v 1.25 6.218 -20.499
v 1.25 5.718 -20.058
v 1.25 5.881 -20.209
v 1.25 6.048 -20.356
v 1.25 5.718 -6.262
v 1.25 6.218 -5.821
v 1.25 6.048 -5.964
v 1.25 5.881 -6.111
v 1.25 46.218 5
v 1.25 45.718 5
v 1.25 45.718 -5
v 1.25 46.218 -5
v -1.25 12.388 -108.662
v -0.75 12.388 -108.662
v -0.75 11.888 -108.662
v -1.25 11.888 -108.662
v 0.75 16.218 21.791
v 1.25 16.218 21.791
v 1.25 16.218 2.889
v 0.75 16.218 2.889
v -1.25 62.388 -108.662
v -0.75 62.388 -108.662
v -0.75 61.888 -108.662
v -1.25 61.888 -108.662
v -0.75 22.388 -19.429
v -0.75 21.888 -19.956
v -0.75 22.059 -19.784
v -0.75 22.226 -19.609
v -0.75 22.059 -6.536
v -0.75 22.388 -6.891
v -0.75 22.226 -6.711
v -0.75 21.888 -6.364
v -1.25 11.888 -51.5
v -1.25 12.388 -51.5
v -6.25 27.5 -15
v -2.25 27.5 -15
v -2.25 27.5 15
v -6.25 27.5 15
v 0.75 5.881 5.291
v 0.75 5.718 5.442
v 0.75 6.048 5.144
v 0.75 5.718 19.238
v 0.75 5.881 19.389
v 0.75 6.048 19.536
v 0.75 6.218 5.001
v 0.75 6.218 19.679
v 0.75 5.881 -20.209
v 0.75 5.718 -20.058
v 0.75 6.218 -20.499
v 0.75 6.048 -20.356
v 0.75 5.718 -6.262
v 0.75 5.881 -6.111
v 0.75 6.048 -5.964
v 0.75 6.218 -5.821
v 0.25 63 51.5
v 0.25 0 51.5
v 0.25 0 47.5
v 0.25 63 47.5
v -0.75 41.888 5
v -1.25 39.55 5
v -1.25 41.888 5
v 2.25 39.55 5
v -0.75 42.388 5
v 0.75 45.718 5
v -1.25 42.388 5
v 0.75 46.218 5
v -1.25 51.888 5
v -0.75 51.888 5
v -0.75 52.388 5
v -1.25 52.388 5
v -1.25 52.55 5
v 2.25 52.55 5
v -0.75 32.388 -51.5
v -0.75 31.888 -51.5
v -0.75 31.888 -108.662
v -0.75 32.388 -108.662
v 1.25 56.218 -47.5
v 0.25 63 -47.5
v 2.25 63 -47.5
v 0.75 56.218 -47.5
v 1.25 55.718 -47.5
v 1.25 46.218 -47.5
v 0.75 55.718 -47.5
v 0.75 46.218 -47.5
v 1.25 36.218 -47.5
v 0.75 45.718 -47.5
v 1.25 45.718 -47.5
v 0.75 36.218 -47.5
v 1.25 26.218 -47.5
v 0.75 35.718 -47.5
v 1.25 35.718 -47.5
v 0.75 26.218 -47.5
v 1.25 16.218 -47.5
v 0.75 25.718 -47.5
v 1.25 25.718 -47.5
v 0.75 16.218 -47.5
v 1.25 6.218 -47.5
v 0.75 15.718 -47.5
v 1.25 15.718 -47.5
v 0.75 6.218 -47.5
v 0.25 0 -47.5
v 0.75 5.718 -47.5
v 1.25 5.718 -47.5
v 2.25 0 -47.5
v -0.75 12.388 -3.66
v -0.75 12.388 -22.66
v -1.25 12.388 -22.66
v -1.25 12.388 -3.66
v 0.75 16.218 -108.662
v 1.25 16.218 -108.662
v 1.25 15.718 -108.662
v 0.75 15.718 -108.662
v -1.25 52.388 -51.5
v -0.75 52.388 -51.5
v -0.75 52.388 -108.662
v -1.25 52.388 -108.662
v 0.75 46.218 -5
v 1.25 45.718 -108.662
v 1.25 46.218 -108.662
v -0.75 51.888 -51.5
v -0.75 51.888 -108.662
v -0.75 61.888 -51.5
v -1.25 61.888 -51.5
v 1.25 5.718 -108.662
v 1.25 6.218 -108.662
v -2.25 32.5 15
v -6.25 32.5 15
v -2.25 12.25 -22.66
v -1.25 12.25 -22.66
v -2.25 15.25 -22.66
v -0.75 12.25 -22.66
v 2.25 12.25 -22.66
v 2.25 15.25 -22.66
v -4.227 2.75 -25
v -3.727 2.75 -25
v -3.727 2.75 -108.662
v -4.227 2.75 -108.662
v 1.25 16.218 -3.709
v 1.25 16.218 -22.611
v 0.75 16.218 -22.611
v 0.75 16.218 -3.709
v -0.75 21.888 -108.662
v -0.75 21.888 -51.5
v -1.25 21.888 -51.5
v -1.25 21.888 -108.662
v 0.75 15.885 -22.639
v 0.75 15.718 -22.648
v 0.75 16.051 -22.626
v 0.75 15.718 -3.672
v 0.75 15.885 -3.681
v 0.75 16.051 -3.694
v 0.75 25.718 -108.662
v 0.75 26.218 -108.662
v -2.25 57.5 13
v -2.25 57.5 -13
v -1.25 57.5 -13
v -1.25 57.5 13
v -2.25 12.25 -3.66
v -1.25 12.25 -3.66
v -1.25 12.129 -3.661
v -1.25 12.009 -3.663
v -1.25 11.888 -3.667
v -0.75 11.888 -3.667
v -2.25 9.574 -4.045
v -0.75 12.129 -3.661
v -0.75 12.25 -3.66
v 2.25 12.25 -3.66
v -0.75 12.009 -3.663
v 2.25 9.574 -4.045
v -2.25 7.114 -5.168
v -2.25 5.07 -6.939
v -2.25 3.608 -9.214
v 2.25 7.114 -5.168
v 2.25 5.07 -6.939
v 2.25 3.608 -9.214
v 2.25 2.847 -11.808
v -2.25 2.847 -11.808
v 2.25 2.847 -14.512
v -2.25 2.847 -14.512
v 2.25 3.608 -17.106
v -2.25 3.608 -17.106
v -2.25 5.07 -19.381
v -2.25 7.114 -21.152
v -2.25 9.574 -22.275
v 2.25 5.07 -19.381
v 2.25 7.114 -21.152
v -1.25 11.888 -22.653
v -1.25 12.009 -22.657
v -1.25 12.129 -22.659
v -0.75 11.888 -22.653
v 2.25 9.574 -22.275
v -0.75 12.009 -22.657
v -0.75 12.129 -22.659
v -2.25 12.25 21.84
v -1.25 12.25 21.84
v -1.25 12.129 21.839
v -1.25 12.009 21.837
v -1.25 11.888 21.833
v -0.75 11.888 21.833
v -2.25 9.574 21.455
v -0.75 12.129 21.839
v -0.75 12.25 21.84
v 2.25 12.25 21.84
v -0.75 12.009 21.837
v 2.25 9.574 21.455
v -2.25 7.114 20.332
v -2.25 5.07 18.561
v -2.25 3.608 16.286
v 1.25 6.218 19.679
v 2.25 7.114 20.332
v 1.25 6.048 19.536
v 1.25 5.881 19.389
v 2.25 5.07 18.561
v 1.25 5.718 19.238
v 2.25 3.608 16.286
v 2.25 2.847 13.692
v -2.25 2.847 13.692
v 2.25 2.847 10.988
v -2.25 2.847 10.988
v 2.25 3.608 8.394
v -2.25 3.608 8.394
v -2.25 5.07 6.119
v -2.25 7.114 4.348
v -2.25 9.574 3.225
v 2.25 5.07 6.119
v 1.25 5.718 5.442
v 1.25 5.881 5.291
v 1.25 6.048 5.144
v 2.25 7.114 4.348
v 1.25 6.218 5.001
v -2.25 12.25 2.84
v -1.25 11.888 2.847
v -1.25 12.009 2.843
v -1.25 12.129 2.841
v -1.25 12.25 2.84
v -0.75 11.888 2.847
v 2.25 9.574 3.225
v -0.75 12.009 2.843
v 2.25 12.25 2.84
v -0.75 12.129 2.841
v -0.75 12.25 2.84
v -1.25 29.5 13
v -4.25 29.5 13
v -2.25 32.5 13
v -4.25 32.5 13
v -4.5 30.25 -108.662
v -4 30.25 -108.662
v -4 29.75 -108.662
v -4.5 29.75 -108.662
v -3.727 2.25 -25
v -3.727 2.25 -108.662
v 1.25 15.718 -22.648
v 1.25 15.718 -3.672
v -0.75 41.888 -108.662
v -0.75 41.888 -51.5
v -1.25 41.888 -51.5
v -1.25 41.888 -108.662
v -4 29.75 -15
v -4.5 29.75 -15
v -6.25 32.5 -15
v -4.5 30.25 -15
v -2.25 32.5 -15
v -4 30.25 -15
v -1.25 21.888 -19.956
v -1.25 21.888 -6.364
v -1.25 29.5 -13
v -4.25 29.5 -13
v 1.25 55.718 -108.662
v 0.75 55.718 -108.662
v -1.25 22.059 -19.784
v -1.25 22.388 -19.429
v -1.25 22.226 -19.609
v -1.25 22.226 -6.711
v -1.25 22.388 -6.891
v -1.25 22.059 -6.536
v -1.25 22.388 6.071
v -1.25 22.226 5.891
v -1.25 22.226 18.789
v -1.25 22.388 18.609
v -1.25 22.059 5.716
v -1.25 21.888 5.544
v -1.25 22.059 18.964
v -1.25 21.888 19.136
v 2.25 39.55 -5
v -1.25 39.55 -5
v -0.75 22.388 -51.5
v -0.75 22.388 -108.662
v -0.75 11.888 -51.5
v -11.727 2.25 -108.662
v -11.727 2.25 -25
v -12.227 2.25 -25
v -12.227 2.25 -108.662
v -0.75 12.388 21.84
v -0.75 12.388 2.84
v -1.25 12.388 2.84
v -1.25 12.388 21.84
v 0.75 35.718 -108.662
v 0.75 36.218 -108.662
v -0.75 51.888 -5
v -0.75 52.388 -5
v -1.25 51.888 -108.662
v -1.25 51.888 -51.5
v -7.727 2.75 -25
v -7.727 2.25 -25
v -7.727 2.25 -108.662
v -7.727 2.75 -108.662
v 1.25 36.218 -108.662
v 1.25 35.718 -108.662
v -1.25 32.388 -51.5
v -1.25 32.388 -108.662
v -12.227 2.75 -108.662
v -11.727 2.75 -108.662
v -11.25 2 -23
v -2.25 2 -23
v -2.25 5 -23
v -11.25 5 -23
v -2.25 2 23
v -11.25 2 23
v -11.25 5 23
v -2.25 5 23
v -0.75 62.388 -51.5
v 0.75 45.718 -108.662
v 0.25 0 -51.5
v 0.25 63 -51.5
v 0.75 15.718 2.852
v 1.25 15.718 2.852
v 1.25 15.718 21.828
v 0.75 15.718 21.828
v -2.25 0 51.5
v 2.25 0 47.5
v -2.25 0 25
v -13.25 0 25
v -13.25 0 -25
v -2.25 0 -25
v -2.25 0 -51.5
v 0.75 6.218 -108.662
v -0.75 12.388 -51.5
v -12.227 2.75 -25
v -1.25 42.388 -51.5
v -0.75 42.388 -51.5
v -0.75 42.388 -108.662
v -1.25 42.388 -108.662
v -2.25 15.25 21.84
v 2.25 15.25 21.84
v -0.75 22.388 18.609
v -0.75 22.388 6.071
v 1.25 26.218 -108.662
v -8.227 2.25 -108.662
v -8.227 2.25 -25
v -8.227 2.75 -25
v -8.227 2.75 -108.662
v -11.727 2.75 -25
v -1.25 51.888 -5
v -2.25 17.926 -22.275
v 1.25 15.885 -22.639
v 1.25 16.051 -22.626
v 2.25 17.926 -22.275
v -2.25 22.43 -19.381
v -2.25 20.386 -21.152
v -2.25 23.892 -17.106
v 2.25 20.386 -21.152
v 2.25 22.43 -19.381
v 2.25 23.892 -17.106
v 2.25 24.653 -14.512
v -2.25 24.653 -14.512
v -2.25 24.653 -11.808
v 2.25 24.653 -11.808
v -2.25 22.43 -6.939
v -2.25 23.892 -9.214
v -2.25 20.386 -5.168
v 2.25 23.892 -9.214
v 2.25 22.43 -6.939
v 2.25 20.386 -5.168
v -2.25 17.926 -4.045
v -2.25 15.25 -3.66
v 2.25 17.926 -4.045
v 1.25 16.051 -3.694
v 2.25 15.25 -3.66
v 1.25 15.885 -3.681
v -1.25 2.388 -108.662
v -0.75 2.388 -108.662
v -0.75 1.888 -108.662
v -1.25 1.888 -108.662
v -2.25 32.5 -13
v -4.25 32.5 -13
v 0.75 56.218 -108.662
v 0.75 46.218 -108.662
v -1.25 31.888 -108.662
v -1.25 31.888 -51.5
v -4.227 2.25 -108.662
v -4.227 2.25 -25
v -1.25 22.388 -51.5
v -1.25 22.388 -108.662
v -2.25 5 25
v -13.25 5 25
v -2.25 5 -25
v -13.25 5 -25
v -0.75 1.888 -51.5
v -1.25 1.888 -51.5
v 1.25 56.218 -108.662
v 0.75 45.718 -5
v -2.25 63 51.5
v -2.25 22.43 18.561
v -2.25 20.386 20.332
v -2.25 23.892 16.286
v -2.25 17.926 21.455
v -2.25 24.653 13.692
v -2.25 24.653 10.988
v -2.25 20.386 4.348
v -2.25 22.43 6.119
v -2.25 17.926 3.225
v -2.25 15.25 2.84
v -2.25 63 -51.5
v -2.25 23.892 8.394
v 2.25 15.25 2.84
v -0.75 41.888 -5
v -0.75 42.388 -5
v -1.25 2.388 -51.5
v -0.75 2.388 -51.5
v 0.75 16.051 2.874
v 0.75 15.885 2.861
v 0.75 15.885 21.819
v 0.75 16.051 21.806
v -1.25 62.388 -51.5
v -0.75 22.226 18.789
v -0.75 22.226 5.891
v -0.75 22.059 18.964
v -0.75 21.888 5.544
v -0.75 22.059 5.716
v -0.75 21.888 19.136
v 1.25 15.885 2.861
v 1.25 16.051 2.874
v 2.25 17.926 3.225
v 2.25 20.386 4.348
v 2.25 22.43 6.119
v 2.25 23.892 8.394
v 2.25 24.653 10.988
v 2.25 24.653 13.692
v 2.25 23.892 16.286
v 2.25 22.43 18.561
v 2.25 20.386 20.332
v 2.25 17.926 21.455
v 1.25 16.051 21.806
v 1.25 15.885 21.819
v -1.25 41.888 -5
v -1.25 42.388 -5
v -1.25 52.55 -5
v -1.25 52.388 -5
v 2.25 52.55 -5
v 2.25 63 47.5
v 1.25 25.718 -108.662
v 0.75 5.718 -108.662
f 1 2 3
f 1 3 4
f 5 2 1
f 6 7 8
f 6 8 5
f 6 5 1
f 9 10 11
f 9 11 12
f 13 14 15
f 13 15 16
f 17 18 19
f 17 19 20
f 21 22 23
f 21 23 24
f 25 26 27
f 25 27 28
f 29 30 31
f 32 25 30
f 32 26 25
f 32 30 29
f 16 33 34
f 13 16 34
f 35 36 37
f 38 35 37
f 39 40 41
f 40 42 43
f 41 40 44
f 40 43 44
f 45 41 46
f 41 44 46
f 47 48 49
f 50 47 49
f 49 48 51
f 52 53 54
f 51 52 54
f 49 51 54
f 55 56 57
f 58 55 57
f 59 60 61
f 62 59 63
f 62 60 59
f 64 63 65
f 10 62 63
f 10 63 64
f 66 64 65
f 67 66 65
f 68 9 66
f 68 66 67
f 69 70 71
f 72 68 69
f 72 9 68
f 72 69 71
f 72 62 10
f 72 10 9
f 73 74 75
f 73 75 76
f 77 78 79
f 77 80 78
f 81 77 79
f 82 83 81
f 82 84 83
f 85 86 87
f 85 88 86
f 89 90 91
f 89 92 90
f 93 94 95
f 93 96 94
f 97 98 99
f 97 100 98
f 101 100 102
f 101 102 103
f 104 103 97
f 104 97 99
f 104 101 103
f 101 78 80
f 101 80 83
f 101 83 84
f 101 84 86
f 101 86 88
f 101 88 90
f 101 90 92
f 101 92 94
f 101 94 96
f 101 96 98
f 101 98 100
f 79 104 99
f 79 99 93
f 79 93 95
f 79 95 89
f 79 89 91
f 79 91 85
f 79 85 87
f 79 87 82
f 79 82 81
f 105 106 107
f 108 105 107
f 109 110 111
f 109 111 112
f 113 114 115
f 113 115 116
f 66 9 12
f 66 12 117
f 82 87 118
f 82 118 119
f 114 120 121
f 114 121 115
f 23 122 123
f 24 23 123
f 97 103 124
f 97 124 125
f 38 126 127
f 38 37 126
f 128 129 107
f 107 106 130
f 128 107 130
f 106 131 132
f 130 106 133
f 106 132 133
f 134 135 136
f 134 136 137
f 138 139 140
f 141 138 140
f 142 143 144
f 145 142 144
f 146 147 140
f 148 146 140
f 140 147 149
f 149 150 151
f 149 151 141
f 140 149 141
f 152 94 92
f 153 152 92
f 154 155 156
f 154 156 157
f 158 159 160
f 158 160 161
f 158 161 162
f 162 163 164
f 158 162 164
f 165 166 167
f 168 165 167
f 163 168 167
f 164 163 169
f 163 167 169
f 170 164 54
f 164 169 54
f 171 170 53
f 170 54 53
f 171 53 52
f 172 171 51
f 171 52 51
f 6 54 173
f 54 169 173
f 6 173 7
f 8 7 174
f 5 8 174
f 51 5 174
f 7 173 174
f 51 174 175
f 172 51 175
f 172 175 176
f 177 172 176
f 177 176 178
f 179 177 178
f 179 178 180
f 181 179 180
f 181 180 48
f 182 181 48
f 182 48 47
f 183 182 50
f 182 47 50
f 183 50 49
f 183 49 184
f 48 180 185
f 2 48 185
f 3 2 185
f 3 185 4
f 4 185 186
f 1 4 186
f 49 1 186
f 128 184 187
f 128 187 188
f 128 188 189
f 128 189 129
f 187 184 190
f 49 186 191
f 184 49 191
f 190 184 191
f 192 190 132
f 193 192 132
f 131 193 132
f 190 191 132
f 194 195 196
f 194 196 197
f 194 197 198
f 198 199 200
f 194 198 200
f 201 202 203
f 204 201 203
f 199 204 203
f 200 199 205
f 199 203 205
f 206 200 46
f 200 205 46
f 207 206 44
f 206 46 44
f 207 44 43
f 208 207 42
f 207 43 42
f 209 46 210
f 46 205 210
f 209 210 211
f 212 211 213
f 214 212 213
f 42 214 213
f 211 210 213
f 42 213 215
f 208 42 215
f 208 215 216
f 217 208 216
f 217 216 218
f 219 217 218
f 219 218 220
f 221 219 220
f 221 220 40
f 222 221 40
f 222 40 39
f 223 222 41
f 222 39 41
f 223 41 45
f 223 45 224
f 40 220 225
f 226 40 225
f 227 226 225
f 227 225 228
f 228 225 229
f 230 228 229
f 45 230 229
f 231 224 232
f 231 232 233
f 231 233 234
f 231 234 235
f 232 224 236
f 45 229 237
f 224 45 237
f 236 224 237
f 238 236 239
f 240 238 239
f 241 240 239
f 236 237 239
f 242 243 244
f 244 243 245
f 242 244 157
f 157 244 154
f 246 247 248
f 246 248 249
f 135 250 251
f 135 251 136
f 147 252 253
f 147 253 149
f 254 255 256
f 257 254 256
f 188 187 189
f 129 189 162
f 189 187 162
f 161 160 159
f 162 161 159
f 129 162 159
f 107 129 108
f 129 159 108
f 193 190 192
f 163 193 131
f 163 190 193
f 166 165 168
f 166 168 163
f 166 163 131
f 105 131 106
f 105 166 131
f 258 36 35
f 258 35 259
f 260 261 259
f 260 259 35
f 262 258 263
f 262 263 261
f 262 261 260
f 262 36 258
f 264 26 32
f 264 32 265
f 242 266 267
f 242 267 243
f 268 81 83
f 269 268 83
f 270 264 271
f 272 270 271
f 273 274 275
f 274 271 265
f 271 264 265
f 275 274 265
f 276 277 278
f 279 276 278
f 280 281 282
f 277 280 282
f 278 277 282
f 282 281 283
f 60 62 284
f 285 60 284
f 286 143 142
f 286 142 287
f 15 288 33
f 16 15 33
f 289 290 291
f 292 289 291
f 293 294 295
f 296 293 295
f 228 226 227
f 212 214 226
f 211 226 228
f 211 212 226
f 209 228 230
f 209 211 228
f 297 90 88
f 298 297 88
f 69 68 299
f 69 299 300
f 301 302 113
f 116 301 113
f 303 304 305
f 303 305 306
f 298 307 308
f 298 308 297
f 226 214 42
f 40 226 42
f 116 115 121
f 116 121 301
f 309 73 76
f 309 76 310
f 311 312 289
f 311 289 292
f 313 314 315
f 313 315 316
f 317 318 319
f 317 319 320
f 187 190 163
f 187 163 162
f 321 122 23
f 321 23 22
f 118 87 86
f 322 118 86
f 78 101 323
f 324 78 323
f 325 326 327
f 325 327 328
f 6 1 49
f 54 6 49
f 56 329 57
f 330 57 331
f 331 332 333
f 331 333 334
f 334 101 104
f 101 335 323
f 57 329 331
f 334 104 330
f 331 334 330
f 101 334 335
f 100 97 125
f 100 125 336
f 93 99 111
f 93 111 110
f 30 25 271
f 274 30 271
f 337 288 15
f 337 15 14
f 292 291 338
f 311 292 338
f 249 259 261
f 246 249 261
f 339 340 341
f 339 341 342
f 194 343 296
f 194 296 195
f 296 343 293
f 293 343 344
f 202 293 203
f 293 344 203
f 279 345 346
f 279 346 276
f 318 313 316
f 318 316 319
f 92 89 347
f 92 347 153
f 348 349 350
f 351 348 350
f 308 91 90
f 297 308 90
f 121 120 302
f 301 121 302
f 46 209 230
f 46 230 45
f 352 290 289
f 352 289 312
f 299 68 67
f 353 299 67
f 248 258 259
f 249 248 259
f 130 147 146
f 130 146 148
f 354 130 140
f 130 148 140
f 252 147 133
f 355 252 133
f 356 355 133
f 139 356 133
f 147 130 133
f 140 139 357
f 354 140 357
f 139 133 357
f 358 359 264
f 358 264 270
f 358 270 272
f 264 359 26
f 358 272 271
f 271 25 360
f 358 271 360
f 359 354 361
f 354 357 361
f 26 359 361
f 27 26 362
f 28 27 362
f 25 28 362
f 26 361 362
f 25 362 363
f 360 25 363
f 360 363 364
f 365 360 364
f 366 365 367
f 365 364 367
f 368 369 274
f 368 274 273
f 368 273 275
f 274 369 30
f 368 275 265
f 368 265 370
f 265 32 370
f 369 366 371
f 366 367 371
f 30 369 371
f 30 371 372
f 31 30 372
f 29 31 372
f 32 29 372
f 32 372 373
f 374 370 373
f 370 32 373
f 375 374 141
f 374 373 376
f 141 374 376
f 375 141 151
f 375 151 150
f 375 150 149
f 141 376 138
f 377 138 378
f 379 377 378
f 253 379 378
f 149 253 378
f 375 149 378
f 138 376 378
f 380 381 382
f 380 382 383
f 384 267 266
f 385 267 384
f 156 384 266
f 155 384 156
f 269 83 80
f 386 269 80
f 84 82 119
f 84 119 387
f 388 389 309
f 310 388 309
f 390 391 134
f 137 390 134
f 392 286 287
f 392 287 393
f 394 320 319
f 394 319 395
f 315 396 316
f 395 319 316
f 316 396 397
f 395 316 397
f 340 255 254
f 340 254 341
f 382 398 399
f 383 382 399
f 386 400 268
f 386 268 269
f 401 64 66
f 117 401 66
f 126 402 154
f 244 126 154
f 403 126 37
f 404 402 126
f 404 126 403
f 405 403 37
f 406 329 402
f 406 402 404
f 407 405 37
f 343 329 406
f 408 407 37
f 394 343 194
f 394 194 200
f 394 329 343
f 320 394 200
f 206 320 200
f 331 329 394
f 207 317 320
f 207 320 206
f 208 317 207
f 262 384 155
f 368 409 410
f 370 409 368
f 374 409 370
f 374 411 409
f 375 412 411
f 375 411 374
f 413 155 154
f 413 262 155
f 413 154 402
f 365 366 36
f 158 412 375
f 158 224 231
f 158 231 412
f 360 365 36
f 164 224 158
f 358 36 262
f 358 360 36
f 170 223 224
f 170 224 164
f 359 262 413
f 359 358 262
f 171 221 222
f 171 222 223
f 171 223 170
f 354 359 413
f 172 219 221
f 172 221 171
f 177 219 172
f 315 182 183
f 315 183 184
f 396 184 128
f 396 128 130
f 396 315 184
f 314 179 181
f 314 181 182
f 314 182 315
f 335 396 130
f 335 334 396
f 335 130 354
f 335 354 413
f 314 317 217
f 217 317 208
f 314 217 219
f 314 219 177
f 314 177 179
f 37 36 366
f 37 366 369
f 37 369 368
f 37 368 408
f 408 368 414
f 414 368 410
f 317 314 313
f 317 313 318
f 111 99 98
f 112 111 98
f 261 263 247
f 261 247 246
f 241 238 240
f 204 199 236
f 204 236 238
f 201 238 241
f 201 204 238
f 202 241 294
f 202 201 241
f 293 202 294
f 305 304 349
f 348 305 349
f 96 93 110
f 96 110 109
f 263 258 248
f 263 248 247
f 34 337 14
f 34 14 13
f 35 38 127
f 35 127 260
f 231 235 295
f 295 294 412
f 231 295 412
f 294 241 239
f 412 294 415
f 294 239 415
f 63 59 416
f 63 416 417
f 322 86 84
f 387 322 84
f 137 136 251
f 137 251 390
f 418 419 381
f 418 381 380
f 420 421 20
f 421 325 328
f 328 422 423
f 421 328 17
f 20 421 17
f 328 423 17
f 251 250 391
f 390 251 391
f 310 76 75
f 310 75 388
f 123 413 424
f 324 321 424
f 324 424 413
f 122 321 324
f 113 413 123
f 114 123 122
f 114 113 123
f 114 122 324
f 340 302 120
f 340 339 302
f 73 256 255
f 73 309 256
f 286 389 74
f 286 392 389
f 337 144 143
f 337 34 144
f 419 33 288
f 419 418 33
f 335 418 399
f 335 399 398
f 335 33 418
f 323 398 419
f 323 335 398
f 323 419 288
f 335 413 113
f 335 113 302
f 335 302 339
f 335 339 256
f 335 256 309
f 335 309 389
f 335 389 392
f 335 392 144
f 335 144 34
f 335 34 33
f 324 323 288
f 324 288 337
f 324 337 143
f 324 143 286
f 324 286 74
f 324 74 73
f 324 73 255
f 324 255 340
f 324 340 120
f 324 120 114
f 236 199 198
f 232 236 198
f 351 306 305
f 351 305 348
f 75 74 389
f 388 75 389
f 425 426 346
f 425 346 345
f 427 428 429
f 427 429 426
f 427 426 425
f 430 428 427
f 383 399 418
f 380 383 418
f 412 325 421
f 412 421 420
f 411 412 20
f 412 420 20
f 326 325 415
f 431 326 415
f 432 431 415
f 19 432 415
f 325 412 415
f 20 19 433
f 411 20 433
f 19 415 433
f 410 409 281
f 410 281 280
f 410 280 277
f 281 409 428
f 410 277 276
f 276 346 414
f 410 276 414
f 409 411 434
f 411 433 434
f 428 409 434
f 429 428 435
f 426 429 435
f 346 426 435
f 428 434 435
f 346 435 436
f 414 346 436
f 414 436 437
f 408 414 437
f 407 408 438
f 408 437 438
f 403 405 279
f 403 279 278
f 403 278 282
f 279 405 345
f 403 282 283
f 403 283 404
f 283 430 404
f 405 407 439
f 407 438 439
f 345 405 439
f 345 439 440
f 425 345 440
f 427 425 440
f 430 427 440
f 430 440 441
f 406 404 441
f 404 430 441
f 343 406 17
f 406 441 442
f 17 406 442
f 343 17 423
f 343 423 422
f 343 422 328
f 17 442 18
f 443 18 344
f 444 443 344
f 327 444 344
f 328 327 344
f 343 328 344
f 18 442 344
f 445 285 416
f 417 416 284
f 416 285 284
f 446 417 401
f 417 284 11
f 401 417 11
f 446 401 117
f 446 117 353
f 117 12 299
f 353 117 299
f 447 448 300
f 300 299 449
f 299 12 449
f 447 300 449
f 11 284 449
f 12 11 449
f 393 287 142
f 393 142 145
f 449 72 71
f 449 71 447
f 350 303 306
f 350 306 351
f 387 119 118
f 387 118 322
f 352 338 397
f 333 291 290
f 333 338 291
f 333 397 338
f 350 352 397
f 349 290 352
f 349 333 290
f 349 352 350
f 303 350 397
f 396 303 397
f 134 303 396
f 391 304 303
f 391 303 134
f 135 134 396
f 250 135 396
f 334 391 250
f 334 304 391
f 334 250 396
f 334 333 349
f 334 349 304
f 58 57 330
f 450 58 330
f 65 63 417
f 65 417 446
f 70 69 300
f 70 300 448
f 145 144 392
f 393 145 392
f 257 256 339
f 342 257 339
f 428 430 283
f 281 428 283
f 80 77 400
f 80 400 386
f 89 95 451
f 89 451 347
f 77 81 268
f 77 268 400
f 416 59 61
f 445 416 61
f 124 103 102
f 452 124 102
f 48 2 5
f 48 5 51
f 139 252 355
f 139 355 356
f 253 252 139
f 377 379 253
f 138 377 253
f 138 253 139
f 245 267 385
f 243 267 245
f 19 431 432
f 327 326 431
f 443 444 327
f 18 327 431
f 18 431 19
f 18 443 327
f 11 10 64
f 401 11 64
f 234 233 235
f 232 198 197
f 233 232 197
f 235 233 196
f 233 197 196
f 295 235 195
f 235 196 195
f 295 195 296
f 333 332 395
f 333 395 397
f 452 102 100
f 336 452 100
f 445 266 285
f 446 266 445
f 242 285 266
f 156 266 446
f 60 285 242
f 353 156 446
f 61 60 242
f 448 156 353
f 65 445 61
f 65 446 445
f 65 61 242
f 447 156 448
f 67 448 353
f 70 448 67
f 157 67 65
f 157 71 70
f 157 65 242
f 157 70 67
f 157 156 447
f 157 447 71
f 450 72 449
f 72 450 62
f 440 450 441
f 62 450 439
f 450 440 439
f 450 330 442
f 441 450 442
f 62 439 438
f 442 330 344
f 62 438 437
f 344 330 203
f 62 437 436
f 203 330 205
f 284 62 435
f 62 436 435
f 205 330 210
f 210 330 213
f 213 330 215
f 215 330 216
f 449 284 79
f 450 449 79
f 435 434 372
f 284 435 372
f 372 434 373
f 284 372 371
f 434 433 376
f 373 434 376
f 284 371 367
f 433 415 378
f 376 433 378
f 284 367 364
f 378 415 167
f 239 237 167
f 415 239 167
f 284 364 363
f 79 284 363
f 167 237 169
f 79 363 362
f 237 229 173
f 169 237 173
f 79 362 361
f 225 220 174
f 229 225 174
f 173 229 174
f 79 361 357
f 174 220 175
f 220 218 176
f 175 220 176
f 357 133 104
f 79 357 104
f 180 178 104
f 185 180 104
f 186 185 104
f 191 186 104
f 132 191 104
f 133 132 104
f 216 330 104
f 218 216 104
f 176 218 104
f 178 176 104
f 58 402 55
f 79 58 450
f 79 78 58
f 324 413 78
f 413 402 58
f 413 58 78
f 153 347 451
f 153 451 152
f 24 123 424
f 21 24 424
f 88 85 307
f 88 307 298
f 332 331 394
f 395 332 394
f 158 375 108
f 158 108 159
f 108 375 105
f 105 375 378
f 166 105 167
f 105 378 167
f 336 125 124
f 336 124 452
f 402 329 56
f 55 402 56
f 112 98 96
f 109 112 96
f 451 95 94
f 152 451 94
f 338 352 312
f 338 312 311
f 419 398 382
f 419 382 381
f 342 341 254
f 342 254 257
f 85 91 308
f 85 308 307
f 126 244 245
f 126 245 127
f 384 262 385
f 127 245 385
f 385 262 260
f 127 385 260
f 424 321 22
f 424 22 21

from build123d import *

# Parameters (mm, degrees)
SKETCH_1_W          = 2.5
SKETCH_1_H          = 103
SKETCH_1_W_2        = 2
SKETCH_1_H_2        = 95
EXTRUDE_1_DEPTH     = 63
SKETCH_5_W          = 50
SKETCH_5_H          = 2
EXTRUDE_2_DEPTH     = 11
EXTRUDE_3_DEPTH     = 3
CUT_EXTRUDE_1_DEPTH = 4.5
SKETCH_11_W         = 8.5
SKETCH_11_H         = 11.5
CUT_EXTRUDE_2_DEPTH = 4.5
SKETCH_12_W         = 26
SKETCH_12_H         = 28
SKETCH_12_W_2       = 25
SKETCH_12_H_2       = 27
SKETCH_12_W_3       = 8.5
SKETCH_12_H_3       = 11.5
CUT_EXTRUDE_3_DEPTH = 1
SKETCH_13_W         = 30
SKETCH_13_H         = 2
EXTRUDE_4_DEPTH     = 4
EXTRUDE_5_DEPTH     = 3
SKETCH_15_W         = 10
SKETCH_15_H         = 13
CUT_EXTRUDE_5_DEPTH = 10
EXTRUDE_START       = -73.34
SKETCH_16_W         = 0.5
SKETCH_16_H         = 0.5
EXTRUDE_6_DEPTH     = 130.501615
EXTRUDE_START_2     = -69.328472
SKETCH_17_W         = 0.5
SKETCH_17_H         = 0.5
EXTRUDE_7_DEPTH     = 130.490087
SKETCH_18_W         = 0.5
SKETCH_18_H         = 0.5
EXTRUDE_8_DEPTH     = 83.66161453
SKETCH_19_W         = 0.5
SKETCH_19_H         = 0.5
EXTRUDE_9_DEPTH     = 93.66161453


with BuildPart() as part:
    # 스케치1 → 보스-돌출1 (new body)
    with BuildSketch(Plane(origin=(0, 0, 0), x_dir=(1, 0, 0), z_dir=(0, 1, 0))):
        with Locations((-1, 0)):
            Rectangle(SKETCH_1_W, SKETCH_1_H)
        with Locations((1.25, 0)):
            Rectangle(SKETCH_1_W_2, SKETCH_1_H_2)
    extrude(amount=EXTRUDE_1_DEPTH)

    # 스케치5 → 보스-돌출2 (add)
    with BuildSketch(Plane.ZY.offset(2.25)):
        with Locations((0, 1)):
            Rectangle(SKETCH_5_W, SKETCH_5_H)
    extrude(amount=EXTRUDE_2_DEPTH)

    # 스케치7 → 보스-돌출3 (add)
    with BuildSketch(Plane(origin=(0, 2, 0), x_dir=(1, 0, 0), z_dir=(0, 1, 0))):
        Polygon((-2.25, 23), (-11.25, 23), (-11.25, -23), (-2.25, -23), (-2.25, -25), (-13.25, -25), (-13.25, 25), (-2.25, 25), align=None)
    extrude(amount=EXTRUDE_3_DEPTH)

    # 스케치10 → 컷-돌출1 (cut)
    with BuildSketch(Plane(origin=(2.25, 0, 0), x_dir=(0, 0, -1), z_dir=(1, 0, 0))):
        with BuildLine():
            Line((-21.84, 15.25), (-21.84, 12.25))
            ThreePointArc((-21.84, 12.25), (-12.34, 2.75), (-2.84, 12.25))
            Line((-2.84, 12.25), (-2.84, 15.25))
            ThreePointArc((-2.84, 15.25), (-12.34, 24.75), (-21.84, 15.25))
        make_face()
        with BuildLine():
            Line((3.66, 15.25), (3.66, 12.25))
            ThreePointArc((3.66, 12.25), (13.16, 2.75), (22.66, 12.25))
            Line((22.66, 12.25), (22.66, 15.25))
            ThreePointArc((22.66, 15.25), (13.16, 24.75), (3.66, 15.25))
        make_face()
    extrude(amount=-CUT_EXTRUDE_1_DEPTH, mode=Mode.SUBTRACT)

    # 스케치11 → 컷-돌출2 (cut)
    with BuildSketch(Plane.ZY.offset(2.25)):
        with Locations((0, 46.05)):
            Rectangle(SKETCH_11_W, SKETCH_11_H)
    extrude(amount=-CUT_EXTRUDE_2_DEPTH, mode=Mode.SUBTRACT)

    # 스케치12 → 컷-돌출3 (cut)
    # profile 1 of 2: a face of its own
    with BuildSketch(Plane.ZY.offset(2.25)):
        with Locations((0, 43.5)):
            Rectangle(SKETCH_12_W, SKETCH_12_H)
        with Locations((0, 43.5)):
            Rectangle(SKETCH_12_W_2, SKETCH_12_H_2, mode=Mode.SUBTRACT)
    # profile 2 of 2: a face of its own
    with BuildSketch(Plane.ZY.offset(2.25)):
        with Locations((0, 43.5)):
            Rectangle(SKETCH_12_W_2, SKETCH_12_H_2)
        with Locations((0, 46.05)):
            Rectangle(SKETCH_12_W_3, SKETCH_12_H_3, mode=Mode.SUBTRACT)
    extrude(amount=-CUT_EXTRUDE_3_DEPTH, mode=Mode.SUBTRACT)

    # 스케치13 → 보스-돌출4 (add)
    with BuildSketch(Plane.ZY.offset(2.25)):
        with Locations((0, 28.5)):
            Rectangle(SKETCH_13_W, SKETCH_13_H)
    extrude(amount=EXTRUDE_4_DEPTH)

    # 스케치14 → 보스-돌출5 (add)
    with BuildSketch(Plane(origin=(0, 29.5, 0), x_dir=(1, 0, 0), z_dir=(0, 1, 0))):
        Polygon((-2.25, -13), (-2.25, -15), (-6.25, -15), (-6.25, 15), (-2.25, 15), (-2.25, 13), (-4.25, 13), (-4.25, -13), align=None)
    extrude(amount=EXTRUDE_5_DEPTH)

    # 스케치15 → 컷-돌출5 (cut)
    with BuildSketch(Plane(origin=(2.25, 0, 0), x_dir=(0, 0, -1), z_dir=(1, 0, 0))):
        with Locations((0, 46.05)):
            Rectangle(SKETCH_15_W, SKETCH_15_H)
    extrude(amount=-CUT_EXTRUDE_5_DEPTH, mode=Mode.SUBTRACT)

    # 스케치16 → 보스-돌출6 (add)
    with BuildSketch(Plane(origin=(0, 0, -51.5), x_dir=(-1, 0, 0), z_dir=(0, 0, -1)).offset(EXTRUDE_START)):
        with Locations((1, 2.138286898)):
            Rectangle(SKETCH_16_W, SKETCH_16_H)
        with Locations((1, 12.138286898)):
            Rectangle(SKETCH_16_W, SKETCH_16_H)
        with Locations((1, 22.138286898)):
            Rectangle(SKETCH_16_W, SKETCH_16_H)
        with Locations((1, 32.138286898)):
            Rectangle(SKETCH_16_W, SKETCH_16_H)
        with Locations((1, 42.138286898)):
            Rectangle(SKETCH_16_W, SKETCH_16_H)
        with Locations((1, 52.138286898)):
            Rectangle(SKETCH_16_W, SKETCH_16_H)
        with Locations((1, 62.138286898)):
            Rectangle(SKETCH_16_W, SKETCH_16_H)
    extrude(amount=EXTRUDE_6_DEPTH)

    # 스케치17 → 보스-돌출7 (add)
    with BuildSketch(Plane(origin=(0, 0, -47.5), x_dir=(-1, 0, 0), z_dir=(0, 0, -1)).offset(EXTRUDE_START_2)):
        with Locations((-1, 5.967868798)):
            Rectangle(SKETCH_17_W, SKETCH_17_H)
        with Locations((-1, 15.967868798)):
            Rectangle(SKETCH_17_W, SKETCH_17_H)
        with Locations((-1, 25.967868798)):
            Rectangle(SKETCH_17_W, SKETCH_17_H)
        with Locations((-1, 35.967868798)):
            Rectangle(SKETCH_17_W, SKETCH_17_H)
        with Locations((-1, 45.967868798)):
            Rectangle(SKETCH_17_W, SKETCH_17_H)
        with Locations((-1, 55.967868798)):
            Rectangle(SKETCH_17_W, SKETCH_17_H)
    extrude(amount=EXTRUDE_7_DEPTH)

    # 스케치18 → 보스-돌출8 (add)
    with BuildSketch(Plane(origin=(0, 0, -25), x_dir=(-1, 0, 0), z_dir=(0, 0, -1))):
        with Locations((3.97675174, 2.5)):
            Rectangle(SKETCH_18_W, SKETCH_18_H)
        with Locations((7.97675174, 2.5)):
            Rectangle(SKETCH_18_W, SKETCH_18_H)
        with Locations((11.97675174, 2.5)):
            Rectangle(SKETCH_18_W, SKETCH_18_H)
    extrude(amount=EXTRUDE_8_DEPTH)

    # 스케치19 → 보스-돌출9 (add)
    with BuildSketch(Plane(origin=(0, 0, -15), x_dir=(-1, 0, 0), z_dir=(0, 0, -1))):
        with Locations((4.25, 30)):
            Rectangle(SKETCH_19_W, SKETCH_19_H)
    extrude(amount=EXTRUDE_9_DEPTH)


solid = part.part
